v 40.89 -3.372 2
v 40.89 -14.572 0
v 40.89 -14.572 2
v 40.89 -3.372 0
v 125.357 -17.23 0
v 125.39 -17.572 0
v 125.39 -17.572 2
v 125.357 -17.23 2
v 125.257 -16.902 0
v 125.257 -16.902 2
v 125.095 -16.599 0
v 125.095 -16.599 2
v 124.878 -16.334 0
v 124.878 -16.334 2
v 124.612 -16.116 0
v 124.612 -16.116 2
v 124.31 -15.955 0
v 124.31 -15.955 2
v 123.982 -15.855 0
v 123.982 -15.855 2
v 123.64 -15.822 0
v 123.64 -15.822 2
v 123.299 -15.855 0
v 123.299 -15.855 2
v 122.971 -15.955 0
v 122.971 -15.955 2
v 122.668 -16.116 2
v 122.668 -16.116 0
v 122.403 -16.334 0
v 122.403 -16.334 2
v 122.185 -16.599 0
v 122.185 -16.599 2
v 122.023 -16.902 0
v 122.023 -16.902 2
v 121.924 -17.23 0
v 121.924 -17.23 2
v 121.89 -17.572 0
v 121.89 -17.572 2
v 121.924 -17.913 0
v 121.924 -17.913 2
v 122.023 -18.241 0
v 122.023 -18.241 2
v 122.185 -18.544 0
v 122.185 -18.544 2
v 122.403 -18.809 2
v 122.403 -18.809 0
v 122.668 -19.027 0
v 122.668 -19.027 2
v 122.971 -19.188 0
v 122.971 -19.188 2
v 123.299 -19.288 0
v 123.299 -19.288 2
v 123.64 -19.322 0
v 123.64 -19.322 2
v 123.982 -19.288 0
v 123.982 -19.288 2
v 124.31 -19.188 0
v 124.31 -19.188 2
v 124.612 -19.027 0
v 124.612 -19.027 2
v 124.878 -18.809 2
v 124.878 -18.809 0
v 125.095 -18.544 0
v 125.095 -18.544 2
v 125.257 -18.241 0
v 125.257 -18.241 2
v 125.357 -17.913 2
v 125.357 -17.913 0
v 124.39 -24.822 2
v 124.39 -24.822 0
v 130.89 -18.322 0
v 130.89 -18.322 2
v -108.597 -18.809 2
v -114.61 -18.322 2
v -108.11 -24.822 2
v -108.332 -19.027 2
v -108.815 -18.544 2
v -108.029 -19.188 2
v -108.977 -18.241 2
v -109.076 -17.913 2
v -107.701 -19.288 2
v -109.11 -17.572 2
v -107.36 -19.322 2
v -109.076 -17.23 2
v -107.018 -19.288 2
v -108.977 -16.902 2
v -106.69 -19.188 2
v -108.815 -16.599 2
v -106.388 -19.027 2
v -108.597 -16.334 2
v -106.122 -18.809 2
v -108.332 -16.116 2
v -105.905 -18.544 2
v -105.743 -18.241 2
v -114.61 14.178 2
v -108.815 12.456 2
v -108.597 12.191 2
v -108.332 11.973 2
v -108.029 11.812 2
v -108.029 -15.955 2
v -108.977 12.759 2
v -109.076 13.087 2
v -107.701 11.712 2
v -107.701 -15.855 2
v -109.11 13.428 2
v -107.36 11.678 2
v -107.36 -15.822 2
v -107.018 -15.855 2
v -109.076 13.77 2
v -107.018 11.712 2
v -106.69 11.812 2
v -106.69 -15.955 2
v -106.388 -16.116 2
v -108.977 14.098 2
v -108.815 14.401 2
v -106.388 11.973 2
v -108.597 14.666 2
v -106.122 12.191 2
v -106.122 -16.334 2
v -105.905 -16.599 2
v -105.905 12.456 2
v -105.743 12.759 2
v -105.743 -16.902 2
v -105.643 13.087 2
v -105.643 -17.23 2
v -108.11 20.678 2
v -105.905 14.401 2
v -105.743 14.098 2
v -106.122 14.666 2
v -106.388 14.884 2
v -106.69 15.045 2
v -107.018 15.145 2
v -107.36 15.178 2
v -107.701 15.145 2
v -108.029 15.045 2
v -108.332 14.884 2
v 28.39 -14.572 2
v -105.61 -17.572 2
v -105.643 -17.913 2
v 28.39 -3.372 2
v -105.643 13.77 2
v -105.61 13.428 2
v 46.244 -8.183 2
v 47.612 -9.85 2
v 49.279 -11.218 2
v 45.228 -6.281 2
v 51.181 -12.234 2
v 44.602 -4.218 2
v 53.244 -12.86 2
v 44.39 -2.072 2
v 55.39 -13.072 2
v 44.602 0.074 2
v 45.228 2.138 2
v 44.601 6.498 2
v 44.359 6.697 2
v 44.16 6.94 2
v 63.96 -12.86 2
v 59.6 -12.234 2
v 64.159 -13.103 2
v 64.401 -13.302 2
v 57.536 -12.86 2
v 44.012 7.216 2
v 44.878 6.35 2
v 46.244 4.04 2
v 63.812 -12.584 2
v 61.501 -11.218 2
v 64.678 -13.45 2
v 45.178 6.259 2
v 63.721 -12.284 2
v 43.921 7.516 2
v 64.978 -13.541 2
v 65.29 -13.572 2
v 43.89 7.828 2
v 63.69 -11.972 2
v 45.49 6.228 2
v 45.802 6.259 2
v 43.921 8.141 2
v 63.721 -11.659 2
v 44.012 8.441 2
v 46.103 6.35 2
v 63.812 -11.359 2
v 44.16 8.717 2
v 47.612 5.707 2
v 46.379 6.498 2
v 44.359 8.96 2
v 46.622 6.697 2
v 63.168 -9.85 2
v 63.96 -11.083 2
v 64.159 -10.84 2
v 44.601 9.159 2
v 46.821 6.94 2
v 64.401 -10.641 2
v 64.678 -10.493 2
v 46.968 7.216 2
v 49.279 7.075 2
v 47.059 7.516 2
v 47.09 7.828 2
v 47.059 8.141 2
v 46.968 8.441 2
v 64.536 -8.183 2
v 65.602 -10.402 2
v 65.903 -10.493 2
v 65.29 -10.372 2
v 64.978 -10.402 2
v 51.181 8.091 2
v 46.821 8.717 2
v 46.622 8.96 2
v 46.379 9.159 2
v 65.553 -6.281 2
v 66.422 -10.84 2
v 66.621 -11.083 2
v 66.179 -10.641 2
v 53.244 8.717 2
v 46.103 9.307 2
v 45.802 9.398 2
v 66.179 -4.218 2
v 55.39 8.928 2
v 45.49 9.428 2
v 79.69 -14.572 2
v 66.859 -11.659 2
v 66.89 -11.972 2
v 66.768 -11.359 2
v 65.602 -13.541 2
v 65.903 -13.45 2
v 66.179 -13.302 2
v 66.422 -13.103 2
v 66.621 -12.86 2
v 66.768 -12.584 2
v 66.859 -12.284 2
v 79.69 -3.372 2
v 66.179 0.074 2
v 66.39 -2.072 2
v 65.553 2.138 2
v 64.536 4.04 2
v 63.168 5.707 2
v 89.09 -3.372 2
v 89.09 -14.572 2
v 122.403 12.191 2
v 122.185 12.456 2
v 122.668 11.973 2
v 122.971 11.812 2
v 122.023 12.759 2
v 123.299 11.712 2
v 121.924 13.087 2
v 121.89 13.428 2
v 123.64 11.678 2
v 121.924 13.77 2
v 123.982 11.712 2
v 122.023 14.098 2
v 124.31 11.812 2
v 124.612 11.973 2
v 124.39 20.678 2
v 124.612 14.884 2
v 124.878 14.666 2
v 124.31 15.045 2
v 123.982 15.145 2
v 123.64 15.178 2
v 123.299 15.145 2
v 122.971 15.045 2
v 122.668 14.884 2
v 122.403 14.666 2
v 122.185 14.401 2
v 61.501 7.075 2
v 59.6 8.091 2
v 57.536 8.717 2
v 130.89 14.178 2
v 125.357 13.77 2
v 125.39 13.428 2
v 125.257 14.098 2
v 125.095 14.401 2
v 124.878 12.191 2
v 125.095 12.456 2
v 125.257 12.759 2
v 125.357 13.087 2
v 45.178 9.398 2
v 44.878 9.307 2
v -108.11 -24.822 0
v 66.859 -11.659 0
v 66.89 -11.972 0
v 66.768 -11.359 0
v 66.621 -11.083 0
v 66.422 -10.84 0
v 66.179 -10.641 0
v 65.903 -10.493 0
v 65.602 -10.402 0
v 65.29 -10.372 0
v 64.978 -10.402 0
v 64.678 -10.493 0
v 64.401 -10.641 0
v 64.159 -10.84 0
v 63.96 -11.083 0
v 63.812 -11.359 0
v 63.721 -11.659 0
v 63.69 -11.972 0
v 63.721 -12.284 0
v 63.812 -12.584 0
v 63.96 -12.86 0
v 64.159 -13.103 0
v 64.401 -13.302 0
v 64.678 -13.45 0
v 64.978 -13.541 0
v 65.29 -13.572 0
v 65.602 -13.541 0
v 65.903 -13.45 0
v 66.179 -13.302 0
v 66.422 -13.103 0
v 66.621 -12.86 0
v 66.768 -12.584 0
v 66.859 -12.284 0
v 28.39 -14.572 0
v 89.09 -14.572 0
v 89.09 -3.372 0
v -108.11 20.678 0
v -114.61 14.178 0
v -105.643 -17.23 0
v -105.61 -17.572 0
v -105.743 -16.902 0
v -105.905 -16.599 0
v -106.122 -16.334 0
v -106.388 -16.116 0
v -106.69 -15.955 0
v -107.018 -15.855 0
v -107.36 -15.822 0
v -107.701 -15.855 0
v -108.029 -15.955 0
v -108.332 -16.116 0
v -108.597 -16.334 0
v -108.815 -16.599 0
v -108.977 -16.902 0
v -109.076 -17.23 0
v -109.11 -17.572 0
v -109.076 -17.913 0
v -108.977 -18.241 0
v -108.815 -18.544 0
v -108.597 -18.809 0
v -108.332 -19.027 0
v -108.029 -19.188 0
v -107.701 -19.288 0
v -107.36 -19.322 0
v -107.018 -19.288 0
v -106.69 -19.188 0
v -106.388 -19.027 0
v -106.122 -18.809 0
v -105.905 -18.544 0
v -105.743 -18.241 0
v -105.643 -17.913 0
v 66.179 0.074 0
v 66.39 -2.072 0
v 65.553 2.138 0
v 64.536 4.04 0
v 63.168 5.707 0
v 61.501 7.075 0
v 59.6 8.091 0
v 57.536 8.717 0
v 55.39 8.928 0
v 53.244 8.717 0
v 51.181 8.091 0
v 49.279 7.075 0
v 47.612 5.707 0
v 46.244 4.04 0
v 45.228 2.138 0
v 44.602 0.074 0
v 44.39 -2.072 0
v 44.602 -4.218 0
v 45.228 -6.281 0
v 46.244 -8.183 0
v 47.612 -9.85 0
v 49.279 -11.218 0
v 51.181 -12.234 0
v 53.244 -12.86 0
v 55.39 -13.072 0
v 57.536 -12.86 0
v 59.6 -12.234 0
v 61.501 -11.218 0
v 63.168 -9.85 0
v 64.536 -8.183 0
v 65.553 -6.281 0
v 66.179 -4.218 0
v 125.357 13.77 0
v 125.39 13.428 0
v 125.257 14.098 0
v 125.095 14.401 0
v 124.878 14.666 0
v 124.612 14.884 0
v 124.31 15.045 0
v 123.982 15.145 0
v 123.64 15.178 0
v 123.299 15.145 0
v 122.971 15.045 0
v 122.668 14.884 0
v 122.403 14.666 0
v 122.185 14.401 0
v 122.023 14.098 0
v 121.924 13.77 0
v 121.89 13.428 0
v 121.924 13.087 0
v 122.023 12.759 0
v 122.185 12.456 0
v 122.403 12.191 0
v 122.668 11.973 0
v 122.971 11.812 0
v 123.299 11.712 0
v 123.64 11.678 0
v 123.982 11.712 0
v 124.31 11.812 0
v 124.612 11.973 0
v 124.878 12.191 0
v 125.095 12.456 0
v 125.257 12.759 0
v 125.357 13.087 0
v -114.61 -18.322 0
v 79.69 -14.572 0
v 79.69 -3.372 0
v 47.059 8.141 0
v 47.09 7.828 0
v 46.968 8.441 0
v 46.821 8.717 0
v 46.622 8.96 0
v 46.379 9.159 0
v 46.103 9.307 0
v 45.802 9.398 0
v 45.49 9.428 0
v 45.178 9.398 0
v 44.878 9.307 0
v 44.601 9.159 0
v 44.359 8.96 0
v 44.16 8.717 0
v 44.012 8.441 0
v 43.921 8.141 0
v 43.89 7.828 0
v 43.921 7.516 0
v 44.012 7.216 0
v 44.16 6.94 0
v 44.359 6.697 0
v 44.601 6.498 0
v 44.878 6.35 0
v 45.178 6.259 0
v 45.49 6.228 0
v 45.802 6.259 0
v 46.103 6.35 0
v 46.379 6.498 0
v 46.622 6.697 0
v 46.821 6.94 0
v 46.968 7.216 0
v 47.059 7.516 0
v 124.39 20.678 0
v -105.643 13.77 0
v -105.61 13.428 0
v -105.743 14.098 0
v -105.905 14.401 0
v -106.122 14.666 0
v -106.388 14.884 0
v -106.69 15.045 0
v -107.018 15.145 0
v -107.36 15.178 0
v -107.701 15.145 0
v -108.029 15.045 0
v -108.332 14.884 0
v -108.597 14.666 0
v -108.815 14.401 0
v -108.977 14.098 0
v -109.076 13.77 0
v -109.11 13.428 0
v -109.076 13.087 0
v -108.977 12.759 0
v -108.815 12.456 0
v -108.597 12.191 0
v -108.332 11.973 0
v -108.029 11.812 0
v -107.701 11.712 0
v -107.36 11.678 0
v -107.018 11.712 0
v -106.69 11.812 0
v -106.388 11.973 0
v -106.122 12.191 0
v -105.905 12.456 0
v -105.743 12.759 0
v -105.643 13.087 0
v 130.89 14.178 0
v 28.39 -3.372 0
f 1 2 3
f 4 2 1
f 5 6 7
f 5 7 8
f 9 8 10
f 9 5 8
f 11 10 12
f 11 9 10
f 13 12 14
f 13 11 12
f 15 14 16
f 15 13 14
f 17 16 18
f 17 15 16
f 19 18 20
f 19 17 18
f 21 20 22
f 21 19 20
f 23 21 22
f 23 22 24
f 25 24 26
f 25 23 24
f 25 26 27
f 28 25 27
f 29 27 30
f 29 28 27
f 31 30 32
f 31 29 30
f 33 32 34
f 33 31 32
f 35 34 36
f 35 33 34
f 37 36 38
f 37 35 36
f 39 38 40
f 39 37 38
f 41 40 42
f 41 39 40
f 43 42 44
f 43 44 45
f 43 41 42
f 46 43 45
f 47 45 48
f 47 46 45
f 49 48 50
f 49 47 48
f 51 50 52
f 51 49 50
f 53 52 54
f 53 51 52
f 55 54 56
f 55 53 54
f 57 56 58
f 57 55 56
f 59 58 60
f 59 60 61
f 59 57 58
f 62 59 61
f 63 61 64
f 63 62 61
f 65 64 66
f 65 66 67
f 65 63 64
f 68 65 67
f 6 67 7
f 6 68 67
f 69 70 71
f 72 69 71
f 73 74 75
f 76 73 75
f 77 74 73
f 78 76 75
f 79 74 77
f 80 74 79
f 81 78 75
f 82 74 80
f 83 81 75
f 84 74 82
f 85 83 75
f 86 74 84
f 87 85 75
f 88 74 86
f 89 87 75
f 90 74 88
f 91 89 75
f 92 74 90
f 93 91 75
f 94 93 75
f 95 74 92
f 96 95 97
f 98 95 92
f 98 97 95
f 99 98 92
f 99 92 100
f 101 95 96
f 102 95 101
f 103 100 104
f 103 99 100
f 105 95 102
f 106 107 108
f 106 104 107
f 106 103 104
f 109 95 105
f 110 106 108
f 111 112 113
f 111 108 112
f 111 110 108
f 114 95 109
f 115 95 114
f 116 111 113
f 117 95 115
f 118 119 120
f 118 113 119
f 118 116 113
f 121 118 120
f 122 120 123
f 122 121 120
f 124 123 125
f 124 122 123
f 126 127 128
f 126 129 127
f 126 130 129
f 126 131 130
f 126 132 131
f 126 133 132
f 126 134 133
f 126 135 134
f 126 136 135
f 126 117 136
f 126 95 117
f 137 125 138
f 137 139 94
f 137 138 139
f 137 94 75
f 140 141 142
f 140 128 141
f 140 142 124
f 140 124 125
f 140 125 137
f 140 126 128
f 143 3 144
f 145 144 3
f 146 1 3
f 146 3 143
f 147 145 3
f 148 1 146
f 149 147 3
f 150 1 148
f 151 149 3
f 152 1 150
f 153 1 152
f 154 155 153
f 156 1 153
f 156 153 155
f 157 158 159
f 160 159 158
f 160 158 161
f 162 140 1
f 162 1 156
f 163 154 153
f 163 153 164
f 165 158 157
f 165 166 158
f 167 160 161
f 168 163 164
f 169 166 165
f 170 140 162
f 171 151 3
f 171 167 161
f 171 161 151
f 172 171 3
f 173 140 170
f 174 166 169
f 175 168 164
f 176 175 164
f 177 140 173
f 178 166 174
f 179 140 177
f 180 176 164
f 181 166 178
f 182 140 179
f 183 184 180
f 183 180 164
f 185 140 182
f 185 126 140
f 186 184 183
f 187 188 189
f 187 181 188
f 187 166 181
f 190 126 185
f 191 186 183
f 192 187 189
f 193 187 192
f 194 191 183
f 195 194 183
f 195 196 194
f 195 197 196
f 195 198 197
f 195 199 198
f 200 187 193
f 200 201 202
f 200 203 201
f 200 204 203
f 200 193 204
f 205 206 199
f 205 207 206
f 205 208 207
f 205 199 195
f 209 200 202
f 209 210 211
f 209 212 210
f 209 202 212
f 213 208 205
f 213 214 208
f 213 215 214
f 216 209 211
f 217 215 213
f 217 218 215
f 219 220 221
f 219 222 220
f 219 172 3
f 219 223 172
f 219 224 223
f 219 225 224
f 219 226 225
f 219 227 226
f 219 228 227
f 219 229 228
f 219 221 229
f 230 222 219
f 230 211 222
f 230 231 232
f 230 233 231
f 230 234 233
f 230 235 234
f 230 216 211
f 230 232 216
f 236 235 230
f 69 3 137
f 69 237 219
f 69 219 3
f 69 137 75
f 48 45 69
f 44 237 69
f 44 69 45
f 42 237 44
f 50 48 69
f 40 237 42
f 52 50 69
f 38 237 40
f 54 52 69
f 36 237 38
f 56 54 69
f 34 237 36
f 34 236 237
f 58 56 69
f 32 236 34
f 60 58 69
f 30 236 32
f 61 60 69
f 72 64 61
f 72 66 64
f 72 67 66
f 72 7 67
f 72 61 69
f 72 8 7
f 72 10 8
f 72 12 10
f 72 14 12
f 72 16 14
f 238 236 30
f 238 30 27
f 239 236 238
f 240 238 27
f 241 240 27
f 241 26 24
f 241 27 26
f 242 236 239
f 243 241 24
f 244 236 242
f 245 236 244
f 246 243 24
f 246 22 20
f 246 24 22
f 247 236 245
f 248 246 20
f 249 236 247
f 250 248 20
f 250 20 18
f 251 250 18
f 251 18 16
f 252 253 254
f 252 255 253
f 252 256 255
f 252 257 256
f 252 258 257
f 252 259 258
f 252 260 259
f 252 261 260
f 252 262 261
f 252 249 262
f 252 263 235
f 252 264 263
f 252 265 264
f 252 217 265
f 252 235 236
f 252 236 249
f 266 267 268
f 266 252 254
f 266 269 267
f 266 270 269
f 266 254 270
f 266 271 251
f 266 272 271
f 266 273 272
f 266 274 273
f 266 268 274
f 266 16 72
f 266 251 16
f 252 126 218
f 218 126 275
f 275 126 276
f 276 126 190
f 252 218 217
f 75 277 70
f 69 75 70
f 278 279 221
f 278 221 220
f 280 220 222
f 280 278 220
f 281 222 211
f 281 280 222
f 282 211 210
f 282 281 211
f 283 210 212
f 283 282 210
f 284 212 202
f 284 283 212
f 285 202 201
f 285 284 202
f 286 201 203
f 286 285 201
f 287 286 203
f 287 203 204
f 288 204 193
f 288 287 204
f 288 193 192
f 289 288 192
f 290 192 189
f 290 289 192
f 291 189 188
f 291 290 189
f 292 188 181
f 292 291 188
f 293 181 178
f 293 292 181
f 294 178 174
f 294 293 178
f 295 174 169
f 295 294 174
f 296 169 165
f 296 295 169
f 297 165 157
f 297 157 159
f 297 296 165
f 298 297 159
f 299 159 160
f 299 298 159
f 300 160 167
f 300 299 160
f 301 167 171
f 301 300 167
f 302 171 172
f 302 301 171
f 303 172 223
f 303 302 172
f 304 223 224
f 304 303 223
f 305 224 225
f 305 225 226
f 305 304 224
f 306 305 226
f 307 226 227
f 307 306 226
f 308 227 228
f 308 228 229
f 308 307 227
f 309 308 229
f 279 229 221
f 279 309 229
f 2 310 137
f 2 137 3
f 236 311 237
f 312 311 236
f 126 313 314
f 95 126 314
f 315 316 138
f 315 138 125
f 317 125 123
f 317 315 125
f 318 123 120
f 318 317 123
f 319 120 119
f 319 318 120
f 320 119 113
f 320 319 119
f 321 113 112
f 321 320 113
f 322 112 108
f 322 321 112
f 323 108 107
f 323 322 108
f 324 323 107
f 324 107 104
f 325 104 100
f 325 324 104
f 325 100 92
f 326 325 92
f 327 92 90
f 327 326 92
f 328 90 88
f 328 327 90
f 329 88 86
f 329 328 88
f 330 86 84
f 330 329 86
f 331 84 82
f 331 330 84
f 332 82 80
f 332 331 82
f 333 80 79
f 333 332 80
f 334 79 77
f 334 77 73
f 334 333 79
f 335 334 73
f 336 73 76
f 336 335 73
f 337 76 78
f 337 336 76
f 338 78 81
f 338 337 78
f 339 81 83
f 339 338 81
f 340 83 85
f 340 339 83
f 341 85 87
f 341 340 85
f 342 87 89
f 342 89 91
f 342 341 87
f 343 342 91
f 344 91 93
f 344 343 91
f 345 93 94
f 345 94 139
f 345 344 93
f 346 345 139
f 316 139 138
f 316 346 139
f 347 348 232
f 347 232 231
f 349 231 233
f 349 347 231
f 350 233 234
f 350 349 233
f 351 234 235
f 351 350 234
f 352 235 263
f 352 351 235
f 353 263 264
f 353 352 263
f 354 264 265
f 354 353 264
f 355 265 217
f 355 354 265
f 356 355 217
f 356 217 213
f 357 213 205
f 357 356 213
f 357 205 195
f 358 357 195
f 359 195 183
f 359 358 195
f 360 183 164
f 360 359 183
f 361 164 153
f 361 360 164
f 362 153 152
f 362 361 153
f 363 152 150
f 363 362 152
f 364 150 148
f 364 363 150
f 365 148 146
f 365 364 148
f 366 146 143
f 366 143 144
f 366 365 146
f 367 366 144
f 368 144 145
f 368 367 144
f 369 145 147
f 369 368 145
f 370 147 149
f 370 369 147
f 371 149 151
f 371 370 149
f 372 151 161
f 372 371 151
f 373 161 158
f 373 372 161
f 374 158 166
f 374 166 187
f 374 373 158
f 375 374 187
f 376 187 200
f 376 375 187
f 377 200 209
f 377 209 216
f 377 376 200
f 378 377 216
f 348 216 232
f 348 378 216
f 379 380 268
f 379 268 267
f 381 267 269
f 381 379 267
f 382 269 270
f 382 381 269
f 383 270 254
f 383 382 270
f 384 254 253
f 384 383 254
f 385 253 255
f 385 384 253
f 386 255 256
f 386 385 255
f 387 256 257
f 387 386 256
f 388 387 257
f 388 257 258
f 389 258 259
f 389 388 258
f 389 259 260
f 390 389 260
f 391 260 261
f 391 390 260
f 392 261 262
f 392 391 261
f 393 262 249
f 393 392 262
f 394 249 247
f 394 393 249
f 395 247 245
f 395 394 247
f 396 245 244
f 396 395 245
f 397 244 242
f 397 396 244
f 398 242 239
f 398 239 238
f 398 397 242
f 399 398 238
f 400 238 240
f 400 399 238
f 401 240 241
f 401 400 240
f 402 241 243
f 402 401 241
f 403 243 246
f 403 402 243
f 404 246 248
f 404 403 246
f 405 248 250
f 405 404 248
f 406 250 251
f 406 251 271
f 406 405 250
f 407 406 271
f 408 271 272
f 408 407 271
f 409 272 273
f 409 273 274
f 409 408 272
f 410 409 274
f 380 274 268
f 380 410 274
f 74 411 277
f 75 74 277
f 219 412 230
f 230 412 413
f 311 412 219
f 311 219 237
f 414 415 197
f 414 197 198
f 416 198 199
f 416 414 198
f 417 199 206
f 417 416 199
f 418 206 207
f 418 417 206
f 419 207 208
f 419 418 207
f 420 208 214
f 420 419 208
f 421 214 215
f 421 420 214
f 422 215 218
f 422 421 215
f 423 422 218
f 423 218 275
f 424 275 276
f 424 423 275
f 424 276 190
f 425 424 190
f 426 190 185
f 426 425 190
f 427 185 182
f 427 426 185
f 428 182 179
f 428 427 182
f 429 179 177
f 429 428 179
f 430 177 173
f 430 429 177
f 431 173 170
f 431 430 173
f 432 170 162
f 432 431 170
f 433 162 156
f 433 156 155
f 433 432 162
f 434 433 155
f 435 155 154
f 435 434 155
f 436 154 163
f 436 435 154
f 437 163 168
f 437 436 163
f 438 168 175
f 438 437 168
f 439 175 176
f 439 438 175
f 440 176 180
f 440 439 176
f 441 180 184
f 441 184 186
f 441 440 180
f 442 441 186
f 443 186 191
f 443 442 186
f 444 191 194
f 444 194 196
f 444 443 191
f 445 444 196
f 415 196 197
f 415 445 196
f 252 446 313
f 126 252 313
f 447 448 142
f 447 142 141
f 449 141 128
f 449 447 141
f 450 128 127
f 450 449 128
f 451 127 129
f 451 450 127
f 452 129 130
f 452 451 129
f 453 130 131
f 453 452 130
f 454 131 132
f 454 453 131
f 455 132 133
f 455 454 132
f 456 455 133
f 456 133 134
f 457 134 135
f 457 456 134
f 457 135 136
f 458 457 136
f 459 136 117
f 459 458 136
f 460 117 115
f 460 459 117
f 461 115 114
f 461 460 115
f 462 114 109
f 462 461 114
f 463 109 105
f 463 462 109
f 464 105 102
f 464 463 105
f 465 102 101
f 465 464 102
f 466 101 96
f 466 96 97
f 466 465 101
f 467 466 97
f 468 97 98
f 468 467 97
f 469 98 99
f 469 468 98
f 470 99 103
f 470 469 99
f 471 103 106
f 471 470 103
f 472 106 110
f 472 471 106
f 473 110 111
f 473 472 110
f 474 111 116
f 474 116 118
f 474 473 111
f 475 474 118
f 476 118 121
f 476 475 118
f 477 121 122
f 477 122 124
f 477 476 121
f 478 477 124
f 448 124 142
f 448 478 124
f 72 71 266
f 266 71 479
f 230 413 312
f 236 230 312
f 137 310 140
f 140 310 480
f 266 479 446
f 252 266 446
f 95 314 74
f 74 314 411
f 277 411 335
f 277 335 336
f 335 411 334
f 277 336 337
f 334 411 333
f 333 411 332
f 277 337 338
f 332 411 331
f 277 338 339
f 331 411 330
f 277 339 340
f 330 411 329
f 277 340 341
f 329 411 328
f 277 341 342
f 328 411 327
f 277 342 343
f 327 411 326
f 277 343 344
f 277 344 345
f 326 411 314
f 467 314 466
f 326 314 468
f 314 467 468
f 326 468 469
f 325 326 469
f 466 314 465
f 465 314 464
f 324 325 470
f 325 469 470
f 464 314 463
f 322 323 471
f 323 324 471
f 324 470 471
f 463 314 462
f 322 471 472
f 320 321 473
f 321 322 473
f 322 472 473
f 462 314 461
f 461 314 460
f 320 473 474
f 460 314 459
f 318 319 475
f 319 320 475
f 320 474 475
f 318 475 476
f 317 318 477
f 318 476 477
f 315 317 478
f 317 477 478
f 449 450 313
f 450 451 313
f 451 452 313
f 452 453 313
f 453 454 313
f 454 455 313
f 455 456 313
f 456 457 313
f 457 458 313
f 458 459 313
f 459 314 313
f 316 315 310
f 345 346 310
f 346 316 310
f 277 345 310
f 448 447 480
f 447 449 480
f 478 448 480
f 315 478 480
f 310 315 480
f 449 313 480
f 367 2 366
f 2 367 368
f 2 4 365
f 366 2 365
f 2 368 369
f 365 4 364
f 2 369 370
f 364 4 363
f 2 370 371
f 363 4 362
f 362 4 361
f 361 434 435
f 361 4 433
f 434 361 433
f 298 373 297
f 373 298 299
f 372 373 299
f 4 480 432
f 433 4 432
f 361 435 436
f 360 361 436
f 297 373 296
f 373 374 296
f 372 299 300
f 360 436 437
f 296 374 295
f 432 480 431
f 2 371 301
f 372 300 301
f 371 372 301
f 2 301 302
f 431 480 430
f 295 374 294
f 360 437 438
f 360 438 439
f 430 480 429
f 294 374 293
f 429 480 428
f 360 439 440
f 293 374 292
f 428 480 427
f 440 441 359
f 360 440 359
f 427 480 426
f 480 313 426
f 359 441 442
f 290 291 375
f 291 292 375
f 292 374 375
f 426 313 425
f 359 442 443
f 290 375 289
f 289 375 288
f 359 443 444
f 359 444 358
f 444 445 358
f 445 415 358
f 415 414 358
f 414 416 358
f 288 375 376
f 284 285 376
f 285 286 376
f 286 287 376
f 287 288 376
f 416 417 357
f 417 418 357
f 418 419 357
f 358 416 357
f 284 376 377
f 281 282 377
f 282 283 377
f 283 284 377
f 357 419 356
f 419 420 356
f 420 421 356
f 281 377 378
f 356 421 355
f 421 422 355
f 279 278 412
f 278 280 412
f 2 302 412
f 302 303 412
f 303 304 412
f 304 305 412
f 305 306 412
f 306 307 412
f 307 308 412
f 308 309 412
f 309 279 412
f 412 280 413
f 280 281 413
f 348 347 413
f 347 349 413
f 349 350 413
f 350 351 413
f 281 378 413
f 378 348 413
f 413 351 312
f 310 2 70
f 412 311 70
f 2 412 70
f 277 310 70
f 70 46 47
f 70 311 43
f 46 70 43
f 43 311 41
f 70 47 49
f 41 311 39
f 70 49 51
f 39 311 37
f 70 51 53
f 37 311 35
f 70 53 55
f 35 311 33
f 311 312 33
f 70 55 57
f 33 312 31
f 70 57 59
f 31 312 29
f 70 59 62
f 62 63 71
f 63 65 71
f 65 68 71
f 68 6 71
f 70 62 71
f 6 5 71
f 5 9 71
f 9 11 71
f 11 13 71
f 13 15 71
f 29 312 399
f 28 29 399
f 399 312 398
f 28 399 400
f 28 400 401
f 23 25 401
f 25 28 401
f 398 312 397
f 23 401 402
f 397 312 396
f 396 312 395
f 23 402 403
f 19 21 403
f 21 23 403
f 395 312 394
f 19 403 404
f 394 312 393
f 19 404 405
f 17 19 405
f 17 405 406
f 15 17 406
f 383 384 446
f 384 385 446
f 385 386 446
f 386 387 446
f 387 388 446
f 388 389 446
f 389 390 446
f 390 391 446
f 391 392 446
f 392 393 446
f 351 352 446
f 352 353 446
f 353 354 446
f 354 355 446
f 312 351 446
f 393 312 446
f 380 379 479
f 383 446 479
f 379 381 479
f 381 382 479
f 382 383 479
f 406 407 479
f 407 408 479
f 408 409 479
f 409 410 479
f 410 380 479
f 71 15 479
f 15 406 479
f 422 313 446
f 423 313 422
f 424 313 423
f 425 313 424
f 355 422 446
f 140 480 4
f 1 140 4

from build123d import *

# Parameters (mm, degrees)
F0_R     = 1.75
F0_W     = 12.5
F0_H     = 11.2
F0_R_2   = 1.6
F0_R_3   = 11
F0_W_2   = 9.4
F1_DEPTH = 2


with BuildPart() as f1:
    # F0 (on Top) → F1 (new body)
    with BuildSketch(Plane.XY):
        Polygon((124.39022, 20.678444), (-108.10978, 20.678444), (-114.60978, 14.178444), (-114.60978, -18.321556), (-108.10978, -24.821556), (124.39022, -24.821556), (130.89022, -18.321556), (130.89022, 14.178444), align=None)
        with Locations((-107.35978, -17.571556)):
            Circle(F0_R, mode=Mode.SUBTRACT)
        with Locations((-107.35978, 13.428444)):
            Circle(F0_R, mode=Mode.SUBTRACT)
        with Locations((34.64022, -8.971556)):
            Rectangle(F0_W, F0_H, mode=Mode.SUBTRACT)
        with Locations((65.29022, -11.971556)):
            Circle(F0_R_2, mode=Mode.SUBTRACT)
        with Locations((45.49022, 7.828444)):
            Circle(F0_R_2, mode=Mode.SUBTRACT)
        with Locations((55.39022, -2.071556)):
            Circle(F0_R_3, mode=Mode.SUBTRACT)
        with Locations((84.39022, -8.971556)):
            Rectangle(F0_W_2, F0_H, mode=Mode.SUBTRACT)
        with Locations((123.64022, -17.571556)):
            Circle(F0_R, mode=Mode.SUBTRACT)
        with Locations((123.64022, 13.428444)):
            Circle(F0_R, mode=Mode.SUBTRACT)
    extrude(amount=F1_DEPTH)


solid = f1.part
